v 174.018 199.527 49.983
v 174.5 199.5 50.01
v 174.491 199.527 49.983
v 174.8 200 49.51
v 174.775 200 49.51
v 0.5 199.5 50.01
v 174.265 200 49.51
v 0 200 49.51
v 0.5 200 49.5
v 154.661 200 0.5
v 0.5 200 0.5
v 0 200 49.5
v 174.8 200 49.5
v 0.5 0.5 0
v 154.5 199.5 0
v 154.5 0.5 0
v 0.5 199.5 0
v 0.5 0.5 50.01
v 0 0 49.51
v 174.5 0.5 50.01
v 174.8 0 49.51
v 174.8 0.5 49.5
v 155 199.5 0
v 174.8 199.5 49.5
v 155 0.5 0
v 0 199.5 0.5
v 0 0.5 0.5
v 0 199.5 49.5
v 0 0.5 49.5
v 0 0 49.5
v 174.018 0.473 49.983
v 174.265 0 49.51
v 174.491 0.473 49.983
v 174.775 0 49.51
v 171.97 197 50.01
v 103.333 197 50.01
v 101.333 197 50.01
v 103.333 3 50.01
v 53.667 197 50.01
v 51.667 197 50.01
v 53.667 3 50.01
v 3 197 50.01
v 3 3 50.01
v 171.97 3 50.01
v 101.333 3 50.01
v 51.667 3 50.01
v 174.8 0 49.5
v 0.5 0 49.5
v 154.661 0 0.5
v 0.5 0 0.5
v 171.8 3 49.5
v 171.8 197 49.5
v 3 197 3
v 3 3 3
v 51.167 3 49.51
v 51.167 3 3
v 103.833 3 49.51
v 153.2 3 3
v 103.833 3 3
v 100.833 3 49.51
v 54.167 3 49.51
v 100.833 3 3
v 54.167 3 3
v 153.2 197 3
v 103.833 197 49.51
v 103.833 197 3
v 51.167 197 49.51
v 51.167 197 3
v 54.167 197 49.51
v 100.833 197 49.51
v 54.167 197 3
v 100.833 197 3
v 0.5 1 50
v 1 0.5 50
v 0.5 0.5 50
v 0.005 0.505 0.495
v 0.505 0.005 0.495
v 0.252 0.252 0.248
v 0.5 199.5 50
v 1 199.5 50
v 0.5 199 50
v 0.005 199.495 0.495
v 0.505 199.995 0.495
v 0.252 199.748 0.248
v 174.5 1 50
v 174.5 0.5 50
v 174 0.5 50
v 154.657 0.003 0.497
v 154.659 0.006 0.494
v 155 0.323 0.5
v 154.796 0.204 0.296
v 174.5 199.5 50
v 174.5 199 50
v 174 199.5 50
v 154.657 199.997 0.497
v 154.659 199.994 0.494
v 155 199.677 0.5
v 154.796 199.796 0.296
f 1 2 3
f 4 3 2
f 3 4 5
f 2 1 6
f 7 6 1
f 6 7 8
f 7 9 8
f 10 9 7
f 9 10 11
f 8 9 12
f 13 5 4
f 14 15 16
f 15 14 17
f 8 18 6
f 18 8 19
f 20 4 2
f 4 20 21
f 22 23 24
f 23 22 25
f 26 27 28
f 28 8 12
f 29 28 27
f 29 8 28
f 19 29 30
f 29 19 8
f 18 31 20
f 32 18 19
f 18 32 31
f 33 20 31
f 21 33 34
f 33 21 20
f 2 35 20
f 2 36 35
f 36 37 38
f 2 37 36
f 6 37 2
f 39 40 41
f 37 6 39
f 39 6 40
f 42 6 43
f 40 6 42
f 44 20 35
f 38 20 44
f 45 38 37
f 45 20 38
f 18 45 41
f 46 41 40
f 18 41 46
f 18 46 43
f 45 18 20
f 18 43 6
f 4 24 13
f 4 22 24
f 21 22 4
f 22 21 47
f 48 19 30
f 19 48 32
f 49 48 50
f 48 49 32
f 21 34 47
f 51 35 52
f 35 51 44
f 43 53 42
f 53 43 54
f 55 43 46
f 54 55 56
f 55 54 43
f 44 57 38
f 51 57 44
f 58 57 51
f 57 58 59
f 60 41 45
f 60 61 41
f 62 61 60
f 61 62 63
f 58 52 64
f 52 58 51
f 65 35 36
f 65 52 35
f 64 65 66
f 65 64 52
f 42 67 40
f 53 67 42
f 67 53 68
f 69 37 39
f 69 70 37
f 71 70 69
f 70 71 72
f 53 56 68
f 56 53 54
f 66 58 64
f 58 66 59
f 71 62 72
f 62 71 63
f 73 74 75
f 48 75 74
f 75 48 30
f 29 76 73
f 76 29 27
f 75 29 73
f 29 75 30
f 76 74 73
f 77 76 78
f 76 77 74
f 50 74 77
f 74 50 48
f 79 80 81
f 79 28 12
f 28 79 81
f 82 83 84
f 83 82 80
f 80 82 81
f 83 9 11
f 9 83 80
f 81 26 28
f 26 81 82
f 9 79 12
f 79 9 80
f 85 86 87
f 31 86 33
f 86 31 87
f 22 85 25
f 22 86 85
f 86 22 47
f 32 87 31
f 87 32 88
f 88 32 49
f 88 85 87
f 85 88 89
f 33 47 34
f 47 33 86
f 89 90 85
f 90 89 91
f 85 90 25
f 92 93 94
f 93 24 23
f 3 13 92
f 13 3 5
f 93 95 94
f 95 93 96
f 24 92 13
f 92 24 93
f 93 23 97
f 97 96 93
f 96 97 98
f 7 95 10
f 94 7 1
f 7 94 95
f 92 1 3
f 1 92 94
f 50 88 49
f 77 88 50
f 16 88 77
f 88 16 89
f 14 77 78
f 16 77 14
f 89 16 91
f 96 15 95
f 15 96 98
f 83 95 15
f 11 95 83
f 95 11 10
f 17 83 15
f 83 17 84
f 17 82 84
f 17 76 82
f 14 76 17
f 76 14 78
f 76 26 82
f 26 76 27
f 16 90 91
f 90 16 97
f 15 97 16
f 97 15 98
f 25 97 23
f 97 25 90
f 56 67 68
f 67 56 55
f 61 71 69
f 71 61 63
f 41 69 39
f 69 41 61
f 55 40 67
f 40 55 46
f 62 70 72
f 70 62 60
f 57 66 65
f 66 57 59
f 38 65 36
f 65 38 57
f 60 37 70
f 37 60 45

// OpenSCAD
// Version: 0.16
// 0.16: the inner cavity now follows the side taper with the same slope as
// the outer wall, so the (angled) side walls keep a constant thickness over
// the full height instead of thickening towards the top; cross dividers flare
// along the whole height to stay embedded in the tapered side walls.
// Parametric Cutlery Organizer Bin, modularly split into:
//   - bin_shell(): outer box with chamfered top collar, tapered side walls,
//     full-height vertical corner-edge chamfers, bottom edge chamfers and a
//     single full inner cavity (no divider is subtracted from the bin anymore)
//   - divider(): a single removable-style divider slab with a chamfered top
//   - dividers(): places N dividers evenly across the bin (in relation to the
//     bottom footprint) in either orientation (lengthwise or crosswise)
//   - cutlery_organizer(): convenience module combining bin + dividers

/* [Dimensions] */
bottom_width = 155;
length = 200;
height = 50;
wall_thickness = 3.0;
bottom_thickness = 3.0;
chamfer_size = 0.5;

// Side Tapers (Extra width added at the top)
right_extra_top = 20;
left_extra_top = 0;

/* [Dividers] */
// Number of separators (0 = none)
num_dividers = 2;
// "lengthwise" = run along the length and split the width (original behavior)
// "crosswise"  = run along the width and split the length
divider_orientation = "lengthwise"; // [lengthwise, crosswise]
divider_thickness = 3.0;

/* [Hidden] */
// Derived taper geometry (shared by bin and dividers)
z_trans = height - chamfer_size;
r_mid = right_extra_top * (z_trans / height);
l_mid = left_extra_top * (z_trans / height);

// Outer polygon of the shell at a given height (accounts for side taper).
// The outer wall tapers linearly over the full height (slope extra_top/h),
// so the row exactly at z_trans already carries the taper offset.
function outer_poly(w, l, z) =
    z < z_trans
        ? [[0, 0], [w, 0], [w, l], [0, l]]
        : [[-l_mid, 0], [w + r_mid, 0], [w + r_mid, l], [-l_mid, l]];

// Outer polygon on the top face (with the chamfer collar inset)
function top_poly(w, l, chamfer) = [
    [-left_extra_top + chamfer, chamfer],
    [w + right_extra_top - chamfer, chamfer],
    [w + right_extra_top - chamfer, l - chamfer],
    [-left_extra_top + chamfer, l - chamfer]
];

// Inner cavity polygon at a given height. It follows the side taper with the
// same slope as the outer wall, so the wall thickness stays constant over the
// full height (a vertical cavity would let the tapered wall thicken towards
// the top).
function cavity_poly(w, l, wall, z, h, r_extra = 0, l_extra = 0) = [
    [wall - l_extra * (z / h), wall],
    [w + r_extra * (z / h) - wall, wall],
    [w + r_extra * (z / h) - wall, l - wall],
    [wall - l_extra * (z / h), l - wall]
];

// A chamfer wedge is the convex hull of its flat-triangle cross-section rows.
// With more than two rows the wedge can bend at a kink (where the side taper
// meets the top collar), so no external library (e.g. chamfer.scad) is needed.
module flat_triangle(p) {
    polyhedron(points = [p[0], p[1], p[2]], faces = [[0, 1, 2], [2, 1, 0]]);
}

module chamfer_wedge(rows) {
    hull() {
        for (row = rows)
            flat_triangle(row);
    }
}

/* [Bin] */
// The bin alone: outer shell with a single full inner cavity.
module bin_shell(
    b_width,
    len,
    h,
    wall,
    b_thick,
    chamfer,
    r_extra = 20,
    l_extra = 0
) {
    z_tr = h - chamfer;
    r_m = r_extra * (z_tr / h);
    l_m = l_extra * (z_tr / h);

    // Taper slopes (dx/dz) of the outer left/right walls below the top collar
    slope_r = r_m / z_tr;
    slope_l = l_m / z_tr;
    len_r = sqrt(1 + slope_r * slope_r);
    len_l = sqrt(1 + slope_l * slope_l);

    // Projected corner-chamfer offsets for the (possibly tapered) corner cuts
    cnr  = chamfer / len_r;
    cnrz = chamfer * slope_r / len_r;
    cnl  = chamfer / len_l;
    cnlz = chamfer * slope_l / len_l;

    difference() {
        // 1. Outer Box Shape with Top Chamfer Collar
        hull() {
            translate([0, 0, 0])
            linear_extrude(height = 0.01)
            polygon(outer_poly(b_width, len, 0));

            translate([0, 0, z_tr])
            linear_extrude(height = 0.01)
            polygon(outer_poly(b_width, len, z_tr));

            translate([0, 0, h])
            linear_extrude(height = 0.01)
            polygon(top_poly(b_width, len, chamfer));
        }

        // 2. Inner Cavity (full interior; dividers are separate modules).
        // The cavity follows the side taper so the wall keeps a constant
        // thickness from the bottom up through the collar.
        hull() {
            translate([0, 0, b_thick])
            linear_extrude(height = 0.01)
            polygon(cavity_poly(b_width, len, wall, b_thick, h, r_extra, l_extra));

            translate([0, 0, z_tr])
            linear_extrude(height = 0.01)
            polygon(cavity_poly(b_width, len, wall, z_tr, h, r_extra, l_extra));

            translate([0, 0, h + 0.1])
            linear_extrude(height = 0.01)
            polygon(cavity_poly(b_width, len, wall, h, h, r_extra, l_extra));
        }

        // 3. Vertical corner wall-edge chamfers (4 corners), full height: each
        // wedge is the hull of three cross-section rows - at the bottom, at the
        // taper/collar kink, and on the top face - so the bevel runs continuously
        // from the bottom all the way through the collar to the top face.
        // The left corners follow the (possibly tapered) left wall, the right
        // corners follow the tapered right wall, so their offset points use the
        // computed taper offsets.
        chamfer_wedge( // front-left
            [
                [[0, 0, 0], [cnl, 0, cnlz], [0, chamfer, 0]],
                [[-l_m, 0, z_tr], [-l_m + cnl, 0, z_tr + cnlz], [-l_m, chamfer, z_tr]],
                [[-l_extra + chamfer, chamfer, h], [-l_extra + 2*chamfer, chamfer, h], [-l_extra + chamfer, 2*chamfer, h]]
            ]
        );
        chamfer_wedge( // back-left
            [
                [[0, len, 0], [cnl, len, cnlz], [0, len - chamfer, 0]],
                [[-l_m, len, z_tr], [-l_m + cnl, len, z_tr + cnlz], [-l_m, len - chamfer, z_tr]],
                [[-l_extra + chamfer, len - chamfer, h], [-l_extra + 2*chamfer, len - chamfer, h], [-l_extra + chamfer, len - 2*chamfer, h]]
            ]
        );
        chamfer_wedge( // front-right
            [
                [[b_width, 0, 0], [b_width - cnr, 0, cnrz], [b_width, chamfer, 0]],
                [[b_width + r_m, 0, z_tr], [b_width + r_m - cnr, 0, z_tr + cnrz], [b_width + r_m, chamfer, z_tr]],
                [[b_width + r_extra - chamfer, chamfer, h], [b_width + r_extra - 2*chamfer, chamfer, h], [b_width + r_extra - chamfer, 2*chamfer, h]]
            ]
        );
        chamfer_wedge( // back-right
            [
                [[b_width, len, 0], [b_width - cnr, len, cnrz], [b_width, len - chamfer, 0]],
                [[b_width + r_m, len, z_tr], [b_width + r_m - cnr, len, z_tr + cnrz], [b_width + r_m, len - chamfer, z_tr]],
                [[b_width + r_extra - chamfer, len - chamfer, h], [b_width + r_extra - 2*chamfer, len - chamfer, h], [b_width + r_extra - chamfer, len - 2*chamfer, h]]
            ]
        );

        // 4. Horizontal bottom edge chamfers (4 edges).
        chamfer_wedge( // front
            [
                [[0, 0, 0], [0, chamfer, 0], [0, 0, chamfer]],
                [[b_width, 0, 0], [b_width, chamfer, 0], [b_width, 0, chamfer]]
            ]
        );
        chamfer_wedge( // back
            [
                [[0, len, 0], [0, len - chamfer, 0], [0, len, chamfer]],
                [[b_width, len, 0], [b_width, len - chamfer, 0], [b_width, len, chamfer]]
            ]
        );
        chamfer_wedge( // left
            [
                [[0, 0, 0], [chamfer, 0, 0], [0, 0, chamfer]],
                [[0, len, 0], [chamfer, len, 0], [0, len, chamfer]]
            ]
        );
        chamfer_wedge( // right
            [
                [[b_width, 0, 0], [b_width - chamfer, 0, 0], [b_width, 0, chamfer]],
                [[b_width, len, 0], [b_width - chamfer, len, 0], [b_width, len, chamfer]]
            ]
        );
    }
}

/* [Dividers] */
// Small overlap used to bury the divider's ends/floor into the bin walls so
// the union stays manifold (no coplanar face contacts).
eps = 0.01;

// One divider slab. Its top is chamfered along the edges exposed to the
// compartments; the ends that merge into the bin walls are not chamfered.
// `pos` is the divider center measured along the axis it
// divides (x for lengthwise, y for crosswise), in relation to the bottom
// footprint. Crosswise dividers flare outward in the collar region to follow
// the side-wall taper; lengthwise dividers end in the (untapered) front/back
// walls.
module divider(
    orientation,
    pos,
    b_width,
    len,
    h,
    wall,
    b_thick,
    chamfer,
    t,
    r_extra = 20,
    l_extra = 0
) {
    z_tr = h - chamfer;
    zb = b_thick - eps;

    lengthwise = orientation == "lengthwise";

    // Taper offsets of the (tapered) side walls at a given height
    function r0(z) = l_extra * (z / h);
    function r1(z) = r_extra * (z / h);

    // Cross-section rectangles [a0, a1] along the divided axis and
    // [b0, b1] along the divider length, at the bottom/kink and top rows.
    // Along the divided axis: constant for lengthwise dividers (their sides
    // are exposed to the compartments); crosswise dividers follow the
    // side-wall taper at every height so their ends stay embedded in the
    // (now also tapered) side walls.
    a0b = lengthwise ? pos - t/2 : wall - eps - r0(zb);
    a1b = lengthwise ? pos + t/2 : b_width - wall + eps + r1(zb);
    a0m = lengthwise ? pos - t/2 : wall - eps - r0(z_tr);
    a1m = lengthwise ? pos + t/2 : b_width - wall + eps + r1(z_tr);
    a0t = lengthwise ? pos - t/2 : wall - eps - r0(h);
    a1t = lengthwise ? pos + t/2 : b_width - wall + eps + r1(h);

    // Along the divider length: the ends are buried eps into the front/back
    // (or left/right) walls at every height.
    b0 = lengthwise ? wall - eps : pos - t/2;
    b1 = lengthwise ? len - wall + eps : pos + t/2;

    // Bottom row is a thin slab biting into the floor
    hull() {
        translate([0, 0, zb])
        linear_extrude(height = 0.02)
        polygon([[a0b, b0], [a1b, b0], [a1b, b1], [a0b, b1]]);

        // Mid row (at the taper/collar kink)
        translate([0, 0, z_tr])
        linear_extrude(height = 0.01)
        polygon([[a0m, b0], [a1m, b0], [a1m, b1], [a0m, b1]]);
    }

    // Top section with chamfered edges, hung from the mid row
    hull() {
        translate([0, 0, z_tr])
        linear_extrude(height = 0.01)
        polygon([[a0m, b0], [a1m, b0], [a1m, b1], [a0m, b1]]);

        // Ends at h + 0.01 to sit exactly flush with the rim top face (the
        // shell hull's top slab likewise extrudes 0.01 above h). Only the
        // edges exposed to the compartments are chamfered; the ends that join
        // the bin walls run full-width into them (no chamfer notch there).
        translate([0, 0, h])
        linear_extrude(height = 0.01)
        polygon([
            [lengthwise ? a0t + chamfer : a0t, lengthwise ? b0 : b0 + chamfer],
            [lengthwise ? a1t - chamfer : a1t, lengthwise ? b0 : b0 + chamfer],
            [lengthwise ? a1t - chamfer : a1t, lengthwise ? b1 : b1 - chamfer],
            [lengthwise ? a0t + chamfer : a0t, lengthwise ? b1 : b1 - chamfer]
        ]);
    }
}

// Places `count` dividers so the compartments are evenly spaced in relation to
// the bottom footprint: the inner bottom span is divided into count + 1 equal
// sections and each divider is centered on a section boundary.
module dividers(
    count,
    orientation,
    b_width,
    len,
    h,
    wall,
    b_thick,
    chamfer,
    t,
    r_extra = 20,
    l_extra = 0
) {
    if (count > 0) {
        lengthwise = orientation == "lengthwise";
        span = (lengthwise ? b_width : len) - 2 * wall;
        section = span / (count + 1);

        if (section - t < 0)
            echo("WARNING: num_dividers too high for this bin - compartments are narrower than the divider thickness.");

        for (i = [1 : count])
            divider(
                orientation = orientation,
                pos = wall + section * i,
                b_width = b_width,
                len = len,
                h = h,
                wall = wall,
                b_thick = b_thick,
                chamfer = chamfer,
                t = t,
                r_extra = r_extra,
                l_extra = l_extra
            );
    }
}

/* [Assembly] */
// Convenience module: bin shell plus its dividers
module cutlery_organizer(
    b_width,
    len,
    h,
    wall,
    b_thick,
    chamfer,
    count = 1,
    orientation = "lengthwise",
    t = 2.0,
    r_extra = 20,
    l_extra = 0
) {
    bin_shell(b_width, len, h, wall, b_thick, chamfer, r_extra, l_extra);
    dividers(count, orientation, b_width, len, h, wall, b_thick, chamfer, t, r_extra, l_extra);
}

// Render the assembly (bin and dividers are unioned for printing as one part;
// call bin_shell() or dividers() directly to output them separately)
cutlery_organizer(
    b_width = bottom_width,
    len = length,
    h = height,
    wall = wall_thickness,
    b_thick = bottom_thickness,
    chamfer = chamfer_size,
    count = num_dividers,
    orientation = divider_orientation,
    t = divider_thickness,
    r_extra = right_extra_top,
    l_extra = left_extra_top
);
